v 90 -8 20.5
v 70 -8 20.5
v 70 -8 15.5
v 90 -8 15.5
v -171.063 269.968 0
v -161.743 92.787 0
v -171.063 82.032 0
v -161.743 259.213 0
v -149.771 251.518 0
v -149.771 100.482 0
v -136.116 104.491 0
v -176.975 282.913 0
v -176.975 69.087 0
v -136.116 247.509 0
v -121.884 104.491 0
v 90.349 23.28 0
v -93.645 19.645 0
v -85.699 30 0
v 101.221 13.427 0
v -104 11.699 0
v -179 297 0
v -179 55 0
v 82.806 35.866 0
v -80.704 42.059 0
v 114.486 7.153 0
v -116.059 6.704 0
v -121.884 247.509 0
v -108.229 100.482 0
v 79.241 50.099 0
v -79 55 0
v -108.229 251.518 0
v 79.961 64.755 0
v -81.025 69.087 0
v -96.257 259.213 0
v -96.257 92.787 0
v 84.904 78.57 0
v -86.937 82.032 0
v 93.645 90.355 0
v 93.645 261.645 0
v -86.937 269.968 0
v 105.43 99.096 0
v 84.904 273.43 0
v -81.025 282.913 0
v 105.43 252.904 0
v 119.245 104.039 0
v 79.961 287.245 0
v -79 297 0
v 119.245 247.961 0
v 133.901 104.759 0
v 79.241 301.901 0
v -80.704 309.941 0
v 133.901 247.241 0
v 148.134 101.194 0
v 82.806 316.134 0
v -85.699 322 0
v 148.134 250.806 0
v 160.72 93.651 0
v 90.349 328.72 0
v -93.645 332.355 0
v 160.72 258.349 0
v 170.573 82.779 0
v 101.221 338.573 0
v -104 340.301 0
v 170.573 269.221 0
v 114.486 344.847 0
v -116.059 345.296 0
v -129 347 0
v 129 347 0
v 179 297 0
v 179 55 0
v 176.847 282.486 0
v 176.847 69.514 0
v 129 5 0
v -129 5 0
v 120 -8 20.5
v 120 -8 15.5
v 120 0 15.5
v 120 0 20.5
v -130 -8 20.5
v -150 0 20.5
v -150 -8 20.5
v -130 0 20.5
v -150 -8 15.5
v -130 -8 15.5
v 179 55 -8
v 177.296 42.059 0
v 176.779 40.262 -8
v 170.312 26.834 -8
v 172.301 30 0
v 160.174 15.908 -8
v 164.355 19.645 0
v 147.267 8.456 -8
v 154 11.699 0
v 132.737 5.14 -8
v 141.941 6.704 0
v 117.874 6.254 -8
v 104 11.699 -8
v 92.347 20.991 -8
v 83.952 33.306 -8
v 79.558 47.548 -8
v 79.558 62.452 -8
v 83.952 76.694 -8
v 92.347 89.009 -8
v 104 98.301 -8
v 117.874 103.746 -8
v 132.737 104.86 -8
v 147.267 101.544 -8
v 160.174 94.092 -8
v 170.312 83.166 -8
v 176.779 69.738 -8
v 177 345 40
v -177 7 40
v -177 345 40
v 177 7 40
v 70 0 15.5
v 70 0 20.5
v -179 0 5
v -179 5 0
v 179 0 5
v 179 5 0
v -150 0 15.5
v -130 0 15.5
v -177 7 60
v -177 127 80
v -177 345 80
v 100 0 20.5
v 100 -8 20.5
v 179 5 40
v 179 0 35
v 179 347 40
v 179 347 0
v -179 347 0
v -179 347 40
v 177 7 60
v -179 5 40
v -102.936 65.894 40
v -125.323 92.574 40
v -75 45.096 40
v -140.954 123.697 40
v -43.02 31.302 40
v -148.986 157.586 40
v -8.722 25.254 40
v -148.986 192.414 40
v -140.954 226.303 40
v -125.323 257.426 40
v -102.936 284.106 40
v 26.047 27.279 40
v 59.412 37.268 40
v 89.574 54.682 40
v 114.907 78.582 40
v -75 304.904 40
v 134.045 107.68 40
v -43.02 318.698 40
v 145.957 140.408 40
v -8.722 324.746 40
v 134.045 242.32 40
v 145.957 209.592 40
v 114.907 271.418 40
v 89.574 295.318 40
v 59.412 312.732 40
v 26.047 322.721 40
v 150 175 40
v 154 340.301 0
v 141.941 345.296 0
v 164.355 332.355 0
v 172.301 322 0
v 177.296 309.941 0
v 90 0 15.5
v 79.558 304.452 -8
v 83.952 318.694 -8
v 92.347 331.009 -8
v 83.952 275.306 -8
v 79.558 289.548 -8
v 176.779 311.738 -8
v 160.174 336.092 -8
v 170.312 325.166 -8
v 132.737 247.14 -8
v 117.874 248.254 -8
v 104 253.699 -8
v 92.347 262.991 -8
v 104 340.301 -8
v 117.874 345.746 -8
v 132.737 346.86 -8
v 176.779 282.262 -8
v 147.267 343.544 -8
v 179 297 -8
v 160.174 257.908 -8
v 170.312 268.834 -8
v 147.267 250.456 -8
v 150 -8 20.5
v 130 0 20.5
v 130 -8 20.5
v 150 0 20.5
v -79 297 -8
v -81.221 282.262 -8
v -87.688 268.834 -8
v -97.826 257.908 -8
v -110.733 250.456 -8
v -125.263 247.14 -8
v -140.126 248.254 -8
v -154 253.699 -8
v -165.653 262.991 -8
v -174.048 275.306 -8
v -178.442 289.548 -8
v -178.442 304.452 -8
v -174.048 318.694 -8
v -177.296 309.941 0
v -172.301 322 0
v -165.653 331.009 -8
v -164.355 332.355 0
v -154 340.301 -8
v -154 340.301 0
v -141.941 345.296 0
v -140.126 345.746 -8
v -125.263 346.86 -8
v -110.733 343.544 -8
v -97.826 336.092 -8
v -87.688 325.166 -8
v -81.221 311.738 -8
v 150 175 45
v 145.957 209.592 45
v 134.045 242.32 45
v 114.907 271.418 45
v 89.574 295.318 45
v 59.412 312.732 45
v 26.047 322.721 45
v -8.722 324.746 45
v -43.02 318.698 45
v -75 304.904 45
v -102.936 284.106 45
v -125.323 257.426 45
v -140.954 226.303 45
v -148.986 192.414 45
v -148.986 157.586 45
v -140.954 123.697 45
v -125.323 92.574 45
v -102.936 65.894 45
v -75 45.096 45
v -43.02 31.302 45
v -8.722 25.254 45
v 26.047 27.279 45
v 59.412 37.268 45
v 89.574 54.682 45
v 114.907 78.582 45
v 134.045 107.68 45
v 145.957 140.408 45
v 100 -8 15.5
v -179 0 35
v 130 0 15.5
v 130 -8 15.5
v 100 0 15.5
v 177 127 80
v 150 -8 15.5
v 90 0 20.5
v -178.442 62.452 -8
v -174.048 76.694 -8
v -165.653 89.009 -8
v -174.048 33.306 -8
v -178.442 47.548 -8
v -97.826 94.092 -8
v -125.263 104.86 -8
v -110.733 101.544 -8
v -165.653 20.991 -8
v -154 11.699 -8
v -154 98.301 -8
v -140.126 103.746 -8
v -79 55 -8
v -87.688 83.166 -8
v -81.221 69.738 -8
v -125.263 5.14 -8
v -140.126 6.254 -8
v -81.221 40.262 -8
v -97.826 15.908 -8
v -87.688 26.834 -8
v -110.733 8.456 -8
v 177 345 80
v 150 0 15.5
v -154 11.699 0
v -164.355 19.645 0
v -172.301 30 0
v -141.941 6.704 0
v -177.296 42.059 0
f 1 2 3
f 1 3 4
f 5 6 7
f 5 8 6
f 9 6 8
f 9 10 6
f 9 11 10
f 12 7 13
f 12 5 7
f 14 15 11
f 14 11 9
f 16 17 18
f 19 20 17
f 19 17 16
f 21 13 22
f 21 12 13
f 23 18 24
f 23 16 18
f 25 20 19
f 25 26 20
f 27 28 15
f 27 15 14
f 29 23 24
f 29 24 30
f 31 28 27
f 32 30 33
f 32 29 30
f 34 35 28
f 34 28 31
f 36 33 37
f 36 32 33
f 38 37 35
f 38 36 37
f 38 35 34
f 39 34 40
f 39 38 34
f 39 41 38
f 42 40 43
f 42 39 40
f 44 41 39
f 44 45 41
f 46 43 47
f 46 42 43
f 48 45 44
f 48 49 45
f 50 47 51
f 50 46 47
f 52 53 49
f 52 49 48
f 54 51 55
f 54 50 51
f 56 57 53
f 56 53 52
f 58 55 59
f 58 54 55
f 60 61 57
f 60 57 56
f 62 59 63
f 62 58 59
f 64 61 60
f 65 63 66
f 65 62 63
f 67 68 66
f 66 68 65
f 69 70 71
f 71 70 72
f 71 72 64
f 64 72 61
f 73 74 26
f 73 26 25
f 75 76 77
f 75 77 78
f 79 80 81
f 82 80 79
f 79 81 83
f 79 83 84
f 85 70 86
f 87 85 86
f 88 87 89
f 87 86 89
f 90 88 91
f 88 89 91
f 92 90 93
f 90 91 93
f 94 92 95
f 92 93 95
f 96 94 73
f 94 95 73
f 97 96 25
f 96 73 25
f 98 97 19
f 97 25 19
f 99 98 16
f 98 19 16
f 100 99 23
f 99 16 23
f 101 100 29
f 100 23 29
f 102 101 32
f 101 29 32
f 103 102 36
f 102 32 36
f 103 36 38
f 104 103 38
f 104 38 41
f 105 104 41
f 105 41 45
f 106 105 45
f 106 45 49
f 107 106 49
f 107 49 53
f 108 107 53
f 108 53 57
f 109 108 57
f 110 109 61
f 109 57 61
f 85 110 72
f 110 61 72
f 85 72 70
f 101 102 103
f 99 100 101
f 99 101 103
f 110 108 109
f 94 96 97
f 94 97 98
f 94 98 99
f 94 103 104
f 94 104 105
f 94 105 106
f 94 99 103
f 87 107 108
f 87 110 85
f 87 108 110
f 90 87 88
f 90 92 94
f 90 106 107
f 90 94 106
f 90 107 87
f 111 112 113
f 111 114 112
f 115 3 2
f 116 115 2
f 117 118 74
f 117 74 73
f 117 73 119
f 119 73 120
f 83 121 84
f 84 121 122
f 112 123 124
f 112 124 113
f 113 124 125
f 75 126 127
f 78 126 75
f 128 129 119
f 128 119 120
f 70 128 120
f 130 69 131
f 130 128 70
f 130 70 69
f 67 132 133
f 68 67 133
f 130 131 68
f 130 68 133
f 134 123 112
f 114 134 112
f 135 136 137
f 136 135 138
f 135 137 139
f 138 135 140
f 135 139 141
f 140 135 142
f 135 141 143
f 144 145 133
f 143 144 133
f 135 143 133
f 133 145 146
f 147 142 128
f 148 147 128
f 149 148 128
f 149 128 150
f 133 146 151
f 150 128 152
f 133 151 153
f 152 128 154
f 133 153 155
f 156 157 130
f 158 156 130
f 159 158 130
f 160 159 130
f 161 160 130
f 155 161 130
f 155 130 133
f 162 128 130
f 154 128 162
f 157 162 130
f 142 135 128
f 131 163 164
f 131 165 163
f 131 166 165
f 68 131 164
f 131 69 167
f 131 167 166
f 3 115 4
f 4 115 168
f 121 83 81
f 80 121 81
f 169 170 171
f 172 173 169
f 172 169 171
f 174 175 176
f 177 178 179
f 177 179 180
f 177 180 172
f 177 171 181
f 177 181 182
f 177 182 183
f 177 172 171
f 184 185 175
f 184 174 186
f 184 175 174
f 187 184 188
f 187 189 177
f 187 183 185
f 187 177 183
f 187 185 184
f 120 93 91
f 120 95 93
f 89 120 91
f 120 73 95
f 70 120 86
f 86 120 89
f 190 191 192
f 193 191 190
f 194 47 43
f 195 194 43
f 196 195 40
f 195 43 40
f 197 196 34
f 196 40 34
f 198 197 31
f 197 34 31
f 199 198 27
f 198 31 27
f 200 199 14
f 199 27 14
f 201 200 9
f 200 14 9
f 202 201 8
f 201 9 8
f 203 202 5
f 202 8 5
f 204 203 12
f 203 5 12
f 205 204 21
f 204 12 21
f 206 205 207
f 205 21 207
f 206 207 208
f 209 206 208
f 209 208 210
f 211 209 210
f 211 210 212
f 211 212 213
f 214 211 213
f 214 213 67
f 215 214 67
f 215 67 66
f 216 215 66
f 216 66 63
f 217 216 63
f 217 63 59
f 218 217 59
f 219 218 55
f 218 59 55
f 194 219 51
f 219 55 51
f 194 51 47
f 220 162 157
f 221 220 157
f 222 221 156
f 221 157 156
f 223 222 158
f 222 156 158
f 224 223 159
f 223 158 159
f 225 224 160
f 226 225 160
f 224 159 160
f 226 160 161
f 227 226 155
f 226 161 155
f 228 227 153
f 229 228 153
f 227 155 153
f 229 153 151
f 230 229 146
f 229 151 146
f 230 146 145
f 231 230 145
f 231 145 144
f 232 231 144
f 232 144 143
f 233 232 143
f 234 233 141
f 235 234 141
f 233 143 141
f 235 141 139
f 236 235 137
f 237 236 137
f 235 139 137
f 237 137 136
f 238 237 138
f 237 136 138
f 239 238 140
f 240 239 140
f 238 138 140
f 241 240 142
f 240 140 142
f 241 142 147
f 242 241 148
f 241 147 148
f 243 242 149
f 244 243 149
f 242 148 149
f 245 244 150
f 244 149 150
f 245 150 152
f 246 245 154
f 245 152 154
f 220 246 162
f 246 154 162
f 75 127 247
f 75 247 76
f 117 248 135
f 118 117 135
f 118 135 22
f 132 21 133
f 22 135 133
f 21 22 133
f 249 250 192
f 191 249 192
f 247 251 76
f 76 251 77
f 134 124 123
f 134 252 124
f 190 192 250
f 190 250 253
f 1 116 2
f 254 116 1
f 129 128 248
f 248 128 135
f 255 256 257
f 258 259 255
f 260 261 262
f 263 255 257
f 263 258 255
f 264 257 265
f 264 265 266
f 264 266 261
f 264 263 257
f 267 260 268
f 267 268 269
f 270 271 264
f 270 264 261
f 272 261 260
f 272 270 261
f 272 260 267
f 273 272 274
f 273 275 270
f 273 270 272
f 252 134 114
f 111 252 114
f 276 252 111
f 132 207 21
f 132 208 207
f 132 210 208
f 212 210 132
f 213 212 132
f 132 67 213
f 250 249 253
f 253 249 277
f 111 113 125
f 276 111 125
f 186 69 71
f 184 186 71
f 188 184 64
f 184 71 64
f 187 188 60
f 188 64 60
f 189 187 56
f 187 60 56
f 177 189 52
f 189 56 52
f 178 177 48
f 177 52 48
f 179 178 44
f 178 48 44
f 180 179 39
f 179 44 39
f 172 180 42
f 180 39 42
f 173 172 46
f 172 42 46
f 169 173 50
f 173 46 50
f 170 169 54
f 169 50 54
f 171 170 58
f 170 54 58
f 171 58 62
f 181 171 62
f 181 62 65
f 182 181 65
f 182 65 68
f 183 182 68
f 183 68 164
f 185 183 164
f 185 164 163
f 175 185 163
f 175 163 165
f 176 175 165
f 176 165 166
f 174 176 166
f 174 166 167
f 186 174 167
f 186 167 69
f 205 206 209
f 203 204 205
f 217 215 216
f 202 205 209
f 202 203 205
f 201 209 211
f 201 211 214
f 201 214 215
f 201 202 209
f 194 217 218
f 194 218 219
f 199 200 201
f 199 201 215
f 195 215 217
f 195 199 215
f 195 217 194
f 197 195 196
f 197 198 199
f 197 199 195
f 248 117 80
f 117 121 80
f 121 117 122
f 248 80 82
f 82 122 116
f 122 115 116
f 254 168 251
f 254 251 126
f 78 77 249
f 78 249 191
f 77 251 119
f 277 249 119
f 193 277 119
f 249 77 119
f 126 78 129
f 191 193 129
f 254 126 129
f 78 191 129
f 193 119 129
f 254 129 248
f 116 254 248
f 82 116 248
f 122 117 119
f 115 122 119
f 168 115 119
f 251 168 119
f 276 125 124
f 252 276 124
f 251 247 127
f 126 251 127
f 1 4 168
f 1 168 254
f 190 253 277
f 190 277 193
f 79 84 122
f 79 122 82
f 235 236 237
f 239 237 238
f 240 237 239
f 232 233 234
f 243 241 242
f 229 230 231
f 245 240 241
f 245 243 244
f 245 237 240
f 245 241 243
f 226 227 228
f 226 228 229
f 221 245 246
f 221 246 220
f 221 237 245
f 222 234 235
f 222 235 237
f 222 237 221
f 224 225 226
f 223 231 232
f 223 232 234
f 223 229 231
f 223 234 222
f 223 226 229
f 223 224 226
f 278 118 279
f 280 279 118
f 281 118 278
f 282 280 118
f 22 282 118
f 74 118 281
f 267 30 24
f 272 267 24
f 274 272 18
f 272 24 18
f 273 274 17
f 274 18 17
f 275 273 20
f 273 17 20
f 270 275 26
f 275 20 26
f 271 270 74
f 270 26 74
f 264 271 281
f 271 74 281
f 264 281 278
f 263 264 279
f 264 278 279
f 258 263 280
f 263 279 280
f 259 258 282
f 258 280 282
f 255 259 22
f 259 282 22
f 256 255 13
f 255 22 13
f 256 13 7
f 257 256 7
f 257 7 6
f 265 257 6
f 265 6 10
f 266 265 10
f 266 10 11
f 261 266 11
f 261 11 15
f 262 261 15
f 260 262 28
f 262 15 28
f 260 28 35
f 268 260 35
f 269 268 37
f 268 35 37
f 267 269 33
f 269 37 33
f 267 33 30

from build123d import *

# Parameters (mm, degrees)
F0_W      = 347
F0_H      = 40
F1_DEPTH  = 179
F2_SIZE   = 5
F3_W      = 20
F3_H      = 5
F4_DEPTH  = 8
F5_R      = 150
F6_DEPTH  = 5
F8_DEPTH  = 177
F9_R      = 50
F10_DEPTH = 8


with BuildPart() as f1:
    # F0 (on Right) → F1 (new body, symmetric)
    with BuildSketch(Plane.YZ):
        with Locations((173.5, 20)):
            Rectangle(F0_W, F0_H)
    extrude(amount=F1_DEPTH, both=True)

    # F2
    f2_edges = [f1.edges().sort_by_distance(p)[0] for p in [
        (0, 0, 40),
        (0, 0, 0),
    ]]
    chamfer(f2_edges, length=F2_SIZE)

    # F3 (on face) → F4 (join)
    with BuildSketch(Plane.XZ):
        with Locations((-140, 18)):
            Rectangle(F3_W, F3_H)
        with Locations((110, 18)):
            Rectangle(F3_W, F3_H)
        with Locations((140, 18)):
            Rectangle(F3_W, F3_H)
        with Locations((80, 18)):
            Rectangle(F3_W, F3_H)
    extrude(amount=F4_DEPTH)

    # F5 (on face) → F6 (join)
    with BuildSketch(Plane.XY.offset(40)):
        with Locations((0, 175)):
            Circle(F5_R)
    extrude(amount=F6_DEPTH)

    # F9 (on face) → F10 (join)
    with BuildSketch(Plane(origin=(0, 0, 0), x_dir=(1, 0, 0), z_dir=(0, 0, -1))):
        with Locations((129, -55)):
            Circle(F9_R)
        with Locations((-129, -55)):
            Circle(F9_R)
        with Locations((-129, -297)):
            Circle(F9_R)
        with Locations((129, -297)):
            Circle(F9_R)
    extrude(amount=F10_DEPTH)


with BuildPart() as f8:
    # F7 (on Right) → F8 (new body, symmetric)
    with BuildSketch(Plane.YZ):
        Polygon((7, 40), (345, 40), (345, 80), (127, 80), (7, 60), align=None)
    extrude(amount=F8_DEPTH, both=True)


solid = Compound([f1.part, f8.part])
